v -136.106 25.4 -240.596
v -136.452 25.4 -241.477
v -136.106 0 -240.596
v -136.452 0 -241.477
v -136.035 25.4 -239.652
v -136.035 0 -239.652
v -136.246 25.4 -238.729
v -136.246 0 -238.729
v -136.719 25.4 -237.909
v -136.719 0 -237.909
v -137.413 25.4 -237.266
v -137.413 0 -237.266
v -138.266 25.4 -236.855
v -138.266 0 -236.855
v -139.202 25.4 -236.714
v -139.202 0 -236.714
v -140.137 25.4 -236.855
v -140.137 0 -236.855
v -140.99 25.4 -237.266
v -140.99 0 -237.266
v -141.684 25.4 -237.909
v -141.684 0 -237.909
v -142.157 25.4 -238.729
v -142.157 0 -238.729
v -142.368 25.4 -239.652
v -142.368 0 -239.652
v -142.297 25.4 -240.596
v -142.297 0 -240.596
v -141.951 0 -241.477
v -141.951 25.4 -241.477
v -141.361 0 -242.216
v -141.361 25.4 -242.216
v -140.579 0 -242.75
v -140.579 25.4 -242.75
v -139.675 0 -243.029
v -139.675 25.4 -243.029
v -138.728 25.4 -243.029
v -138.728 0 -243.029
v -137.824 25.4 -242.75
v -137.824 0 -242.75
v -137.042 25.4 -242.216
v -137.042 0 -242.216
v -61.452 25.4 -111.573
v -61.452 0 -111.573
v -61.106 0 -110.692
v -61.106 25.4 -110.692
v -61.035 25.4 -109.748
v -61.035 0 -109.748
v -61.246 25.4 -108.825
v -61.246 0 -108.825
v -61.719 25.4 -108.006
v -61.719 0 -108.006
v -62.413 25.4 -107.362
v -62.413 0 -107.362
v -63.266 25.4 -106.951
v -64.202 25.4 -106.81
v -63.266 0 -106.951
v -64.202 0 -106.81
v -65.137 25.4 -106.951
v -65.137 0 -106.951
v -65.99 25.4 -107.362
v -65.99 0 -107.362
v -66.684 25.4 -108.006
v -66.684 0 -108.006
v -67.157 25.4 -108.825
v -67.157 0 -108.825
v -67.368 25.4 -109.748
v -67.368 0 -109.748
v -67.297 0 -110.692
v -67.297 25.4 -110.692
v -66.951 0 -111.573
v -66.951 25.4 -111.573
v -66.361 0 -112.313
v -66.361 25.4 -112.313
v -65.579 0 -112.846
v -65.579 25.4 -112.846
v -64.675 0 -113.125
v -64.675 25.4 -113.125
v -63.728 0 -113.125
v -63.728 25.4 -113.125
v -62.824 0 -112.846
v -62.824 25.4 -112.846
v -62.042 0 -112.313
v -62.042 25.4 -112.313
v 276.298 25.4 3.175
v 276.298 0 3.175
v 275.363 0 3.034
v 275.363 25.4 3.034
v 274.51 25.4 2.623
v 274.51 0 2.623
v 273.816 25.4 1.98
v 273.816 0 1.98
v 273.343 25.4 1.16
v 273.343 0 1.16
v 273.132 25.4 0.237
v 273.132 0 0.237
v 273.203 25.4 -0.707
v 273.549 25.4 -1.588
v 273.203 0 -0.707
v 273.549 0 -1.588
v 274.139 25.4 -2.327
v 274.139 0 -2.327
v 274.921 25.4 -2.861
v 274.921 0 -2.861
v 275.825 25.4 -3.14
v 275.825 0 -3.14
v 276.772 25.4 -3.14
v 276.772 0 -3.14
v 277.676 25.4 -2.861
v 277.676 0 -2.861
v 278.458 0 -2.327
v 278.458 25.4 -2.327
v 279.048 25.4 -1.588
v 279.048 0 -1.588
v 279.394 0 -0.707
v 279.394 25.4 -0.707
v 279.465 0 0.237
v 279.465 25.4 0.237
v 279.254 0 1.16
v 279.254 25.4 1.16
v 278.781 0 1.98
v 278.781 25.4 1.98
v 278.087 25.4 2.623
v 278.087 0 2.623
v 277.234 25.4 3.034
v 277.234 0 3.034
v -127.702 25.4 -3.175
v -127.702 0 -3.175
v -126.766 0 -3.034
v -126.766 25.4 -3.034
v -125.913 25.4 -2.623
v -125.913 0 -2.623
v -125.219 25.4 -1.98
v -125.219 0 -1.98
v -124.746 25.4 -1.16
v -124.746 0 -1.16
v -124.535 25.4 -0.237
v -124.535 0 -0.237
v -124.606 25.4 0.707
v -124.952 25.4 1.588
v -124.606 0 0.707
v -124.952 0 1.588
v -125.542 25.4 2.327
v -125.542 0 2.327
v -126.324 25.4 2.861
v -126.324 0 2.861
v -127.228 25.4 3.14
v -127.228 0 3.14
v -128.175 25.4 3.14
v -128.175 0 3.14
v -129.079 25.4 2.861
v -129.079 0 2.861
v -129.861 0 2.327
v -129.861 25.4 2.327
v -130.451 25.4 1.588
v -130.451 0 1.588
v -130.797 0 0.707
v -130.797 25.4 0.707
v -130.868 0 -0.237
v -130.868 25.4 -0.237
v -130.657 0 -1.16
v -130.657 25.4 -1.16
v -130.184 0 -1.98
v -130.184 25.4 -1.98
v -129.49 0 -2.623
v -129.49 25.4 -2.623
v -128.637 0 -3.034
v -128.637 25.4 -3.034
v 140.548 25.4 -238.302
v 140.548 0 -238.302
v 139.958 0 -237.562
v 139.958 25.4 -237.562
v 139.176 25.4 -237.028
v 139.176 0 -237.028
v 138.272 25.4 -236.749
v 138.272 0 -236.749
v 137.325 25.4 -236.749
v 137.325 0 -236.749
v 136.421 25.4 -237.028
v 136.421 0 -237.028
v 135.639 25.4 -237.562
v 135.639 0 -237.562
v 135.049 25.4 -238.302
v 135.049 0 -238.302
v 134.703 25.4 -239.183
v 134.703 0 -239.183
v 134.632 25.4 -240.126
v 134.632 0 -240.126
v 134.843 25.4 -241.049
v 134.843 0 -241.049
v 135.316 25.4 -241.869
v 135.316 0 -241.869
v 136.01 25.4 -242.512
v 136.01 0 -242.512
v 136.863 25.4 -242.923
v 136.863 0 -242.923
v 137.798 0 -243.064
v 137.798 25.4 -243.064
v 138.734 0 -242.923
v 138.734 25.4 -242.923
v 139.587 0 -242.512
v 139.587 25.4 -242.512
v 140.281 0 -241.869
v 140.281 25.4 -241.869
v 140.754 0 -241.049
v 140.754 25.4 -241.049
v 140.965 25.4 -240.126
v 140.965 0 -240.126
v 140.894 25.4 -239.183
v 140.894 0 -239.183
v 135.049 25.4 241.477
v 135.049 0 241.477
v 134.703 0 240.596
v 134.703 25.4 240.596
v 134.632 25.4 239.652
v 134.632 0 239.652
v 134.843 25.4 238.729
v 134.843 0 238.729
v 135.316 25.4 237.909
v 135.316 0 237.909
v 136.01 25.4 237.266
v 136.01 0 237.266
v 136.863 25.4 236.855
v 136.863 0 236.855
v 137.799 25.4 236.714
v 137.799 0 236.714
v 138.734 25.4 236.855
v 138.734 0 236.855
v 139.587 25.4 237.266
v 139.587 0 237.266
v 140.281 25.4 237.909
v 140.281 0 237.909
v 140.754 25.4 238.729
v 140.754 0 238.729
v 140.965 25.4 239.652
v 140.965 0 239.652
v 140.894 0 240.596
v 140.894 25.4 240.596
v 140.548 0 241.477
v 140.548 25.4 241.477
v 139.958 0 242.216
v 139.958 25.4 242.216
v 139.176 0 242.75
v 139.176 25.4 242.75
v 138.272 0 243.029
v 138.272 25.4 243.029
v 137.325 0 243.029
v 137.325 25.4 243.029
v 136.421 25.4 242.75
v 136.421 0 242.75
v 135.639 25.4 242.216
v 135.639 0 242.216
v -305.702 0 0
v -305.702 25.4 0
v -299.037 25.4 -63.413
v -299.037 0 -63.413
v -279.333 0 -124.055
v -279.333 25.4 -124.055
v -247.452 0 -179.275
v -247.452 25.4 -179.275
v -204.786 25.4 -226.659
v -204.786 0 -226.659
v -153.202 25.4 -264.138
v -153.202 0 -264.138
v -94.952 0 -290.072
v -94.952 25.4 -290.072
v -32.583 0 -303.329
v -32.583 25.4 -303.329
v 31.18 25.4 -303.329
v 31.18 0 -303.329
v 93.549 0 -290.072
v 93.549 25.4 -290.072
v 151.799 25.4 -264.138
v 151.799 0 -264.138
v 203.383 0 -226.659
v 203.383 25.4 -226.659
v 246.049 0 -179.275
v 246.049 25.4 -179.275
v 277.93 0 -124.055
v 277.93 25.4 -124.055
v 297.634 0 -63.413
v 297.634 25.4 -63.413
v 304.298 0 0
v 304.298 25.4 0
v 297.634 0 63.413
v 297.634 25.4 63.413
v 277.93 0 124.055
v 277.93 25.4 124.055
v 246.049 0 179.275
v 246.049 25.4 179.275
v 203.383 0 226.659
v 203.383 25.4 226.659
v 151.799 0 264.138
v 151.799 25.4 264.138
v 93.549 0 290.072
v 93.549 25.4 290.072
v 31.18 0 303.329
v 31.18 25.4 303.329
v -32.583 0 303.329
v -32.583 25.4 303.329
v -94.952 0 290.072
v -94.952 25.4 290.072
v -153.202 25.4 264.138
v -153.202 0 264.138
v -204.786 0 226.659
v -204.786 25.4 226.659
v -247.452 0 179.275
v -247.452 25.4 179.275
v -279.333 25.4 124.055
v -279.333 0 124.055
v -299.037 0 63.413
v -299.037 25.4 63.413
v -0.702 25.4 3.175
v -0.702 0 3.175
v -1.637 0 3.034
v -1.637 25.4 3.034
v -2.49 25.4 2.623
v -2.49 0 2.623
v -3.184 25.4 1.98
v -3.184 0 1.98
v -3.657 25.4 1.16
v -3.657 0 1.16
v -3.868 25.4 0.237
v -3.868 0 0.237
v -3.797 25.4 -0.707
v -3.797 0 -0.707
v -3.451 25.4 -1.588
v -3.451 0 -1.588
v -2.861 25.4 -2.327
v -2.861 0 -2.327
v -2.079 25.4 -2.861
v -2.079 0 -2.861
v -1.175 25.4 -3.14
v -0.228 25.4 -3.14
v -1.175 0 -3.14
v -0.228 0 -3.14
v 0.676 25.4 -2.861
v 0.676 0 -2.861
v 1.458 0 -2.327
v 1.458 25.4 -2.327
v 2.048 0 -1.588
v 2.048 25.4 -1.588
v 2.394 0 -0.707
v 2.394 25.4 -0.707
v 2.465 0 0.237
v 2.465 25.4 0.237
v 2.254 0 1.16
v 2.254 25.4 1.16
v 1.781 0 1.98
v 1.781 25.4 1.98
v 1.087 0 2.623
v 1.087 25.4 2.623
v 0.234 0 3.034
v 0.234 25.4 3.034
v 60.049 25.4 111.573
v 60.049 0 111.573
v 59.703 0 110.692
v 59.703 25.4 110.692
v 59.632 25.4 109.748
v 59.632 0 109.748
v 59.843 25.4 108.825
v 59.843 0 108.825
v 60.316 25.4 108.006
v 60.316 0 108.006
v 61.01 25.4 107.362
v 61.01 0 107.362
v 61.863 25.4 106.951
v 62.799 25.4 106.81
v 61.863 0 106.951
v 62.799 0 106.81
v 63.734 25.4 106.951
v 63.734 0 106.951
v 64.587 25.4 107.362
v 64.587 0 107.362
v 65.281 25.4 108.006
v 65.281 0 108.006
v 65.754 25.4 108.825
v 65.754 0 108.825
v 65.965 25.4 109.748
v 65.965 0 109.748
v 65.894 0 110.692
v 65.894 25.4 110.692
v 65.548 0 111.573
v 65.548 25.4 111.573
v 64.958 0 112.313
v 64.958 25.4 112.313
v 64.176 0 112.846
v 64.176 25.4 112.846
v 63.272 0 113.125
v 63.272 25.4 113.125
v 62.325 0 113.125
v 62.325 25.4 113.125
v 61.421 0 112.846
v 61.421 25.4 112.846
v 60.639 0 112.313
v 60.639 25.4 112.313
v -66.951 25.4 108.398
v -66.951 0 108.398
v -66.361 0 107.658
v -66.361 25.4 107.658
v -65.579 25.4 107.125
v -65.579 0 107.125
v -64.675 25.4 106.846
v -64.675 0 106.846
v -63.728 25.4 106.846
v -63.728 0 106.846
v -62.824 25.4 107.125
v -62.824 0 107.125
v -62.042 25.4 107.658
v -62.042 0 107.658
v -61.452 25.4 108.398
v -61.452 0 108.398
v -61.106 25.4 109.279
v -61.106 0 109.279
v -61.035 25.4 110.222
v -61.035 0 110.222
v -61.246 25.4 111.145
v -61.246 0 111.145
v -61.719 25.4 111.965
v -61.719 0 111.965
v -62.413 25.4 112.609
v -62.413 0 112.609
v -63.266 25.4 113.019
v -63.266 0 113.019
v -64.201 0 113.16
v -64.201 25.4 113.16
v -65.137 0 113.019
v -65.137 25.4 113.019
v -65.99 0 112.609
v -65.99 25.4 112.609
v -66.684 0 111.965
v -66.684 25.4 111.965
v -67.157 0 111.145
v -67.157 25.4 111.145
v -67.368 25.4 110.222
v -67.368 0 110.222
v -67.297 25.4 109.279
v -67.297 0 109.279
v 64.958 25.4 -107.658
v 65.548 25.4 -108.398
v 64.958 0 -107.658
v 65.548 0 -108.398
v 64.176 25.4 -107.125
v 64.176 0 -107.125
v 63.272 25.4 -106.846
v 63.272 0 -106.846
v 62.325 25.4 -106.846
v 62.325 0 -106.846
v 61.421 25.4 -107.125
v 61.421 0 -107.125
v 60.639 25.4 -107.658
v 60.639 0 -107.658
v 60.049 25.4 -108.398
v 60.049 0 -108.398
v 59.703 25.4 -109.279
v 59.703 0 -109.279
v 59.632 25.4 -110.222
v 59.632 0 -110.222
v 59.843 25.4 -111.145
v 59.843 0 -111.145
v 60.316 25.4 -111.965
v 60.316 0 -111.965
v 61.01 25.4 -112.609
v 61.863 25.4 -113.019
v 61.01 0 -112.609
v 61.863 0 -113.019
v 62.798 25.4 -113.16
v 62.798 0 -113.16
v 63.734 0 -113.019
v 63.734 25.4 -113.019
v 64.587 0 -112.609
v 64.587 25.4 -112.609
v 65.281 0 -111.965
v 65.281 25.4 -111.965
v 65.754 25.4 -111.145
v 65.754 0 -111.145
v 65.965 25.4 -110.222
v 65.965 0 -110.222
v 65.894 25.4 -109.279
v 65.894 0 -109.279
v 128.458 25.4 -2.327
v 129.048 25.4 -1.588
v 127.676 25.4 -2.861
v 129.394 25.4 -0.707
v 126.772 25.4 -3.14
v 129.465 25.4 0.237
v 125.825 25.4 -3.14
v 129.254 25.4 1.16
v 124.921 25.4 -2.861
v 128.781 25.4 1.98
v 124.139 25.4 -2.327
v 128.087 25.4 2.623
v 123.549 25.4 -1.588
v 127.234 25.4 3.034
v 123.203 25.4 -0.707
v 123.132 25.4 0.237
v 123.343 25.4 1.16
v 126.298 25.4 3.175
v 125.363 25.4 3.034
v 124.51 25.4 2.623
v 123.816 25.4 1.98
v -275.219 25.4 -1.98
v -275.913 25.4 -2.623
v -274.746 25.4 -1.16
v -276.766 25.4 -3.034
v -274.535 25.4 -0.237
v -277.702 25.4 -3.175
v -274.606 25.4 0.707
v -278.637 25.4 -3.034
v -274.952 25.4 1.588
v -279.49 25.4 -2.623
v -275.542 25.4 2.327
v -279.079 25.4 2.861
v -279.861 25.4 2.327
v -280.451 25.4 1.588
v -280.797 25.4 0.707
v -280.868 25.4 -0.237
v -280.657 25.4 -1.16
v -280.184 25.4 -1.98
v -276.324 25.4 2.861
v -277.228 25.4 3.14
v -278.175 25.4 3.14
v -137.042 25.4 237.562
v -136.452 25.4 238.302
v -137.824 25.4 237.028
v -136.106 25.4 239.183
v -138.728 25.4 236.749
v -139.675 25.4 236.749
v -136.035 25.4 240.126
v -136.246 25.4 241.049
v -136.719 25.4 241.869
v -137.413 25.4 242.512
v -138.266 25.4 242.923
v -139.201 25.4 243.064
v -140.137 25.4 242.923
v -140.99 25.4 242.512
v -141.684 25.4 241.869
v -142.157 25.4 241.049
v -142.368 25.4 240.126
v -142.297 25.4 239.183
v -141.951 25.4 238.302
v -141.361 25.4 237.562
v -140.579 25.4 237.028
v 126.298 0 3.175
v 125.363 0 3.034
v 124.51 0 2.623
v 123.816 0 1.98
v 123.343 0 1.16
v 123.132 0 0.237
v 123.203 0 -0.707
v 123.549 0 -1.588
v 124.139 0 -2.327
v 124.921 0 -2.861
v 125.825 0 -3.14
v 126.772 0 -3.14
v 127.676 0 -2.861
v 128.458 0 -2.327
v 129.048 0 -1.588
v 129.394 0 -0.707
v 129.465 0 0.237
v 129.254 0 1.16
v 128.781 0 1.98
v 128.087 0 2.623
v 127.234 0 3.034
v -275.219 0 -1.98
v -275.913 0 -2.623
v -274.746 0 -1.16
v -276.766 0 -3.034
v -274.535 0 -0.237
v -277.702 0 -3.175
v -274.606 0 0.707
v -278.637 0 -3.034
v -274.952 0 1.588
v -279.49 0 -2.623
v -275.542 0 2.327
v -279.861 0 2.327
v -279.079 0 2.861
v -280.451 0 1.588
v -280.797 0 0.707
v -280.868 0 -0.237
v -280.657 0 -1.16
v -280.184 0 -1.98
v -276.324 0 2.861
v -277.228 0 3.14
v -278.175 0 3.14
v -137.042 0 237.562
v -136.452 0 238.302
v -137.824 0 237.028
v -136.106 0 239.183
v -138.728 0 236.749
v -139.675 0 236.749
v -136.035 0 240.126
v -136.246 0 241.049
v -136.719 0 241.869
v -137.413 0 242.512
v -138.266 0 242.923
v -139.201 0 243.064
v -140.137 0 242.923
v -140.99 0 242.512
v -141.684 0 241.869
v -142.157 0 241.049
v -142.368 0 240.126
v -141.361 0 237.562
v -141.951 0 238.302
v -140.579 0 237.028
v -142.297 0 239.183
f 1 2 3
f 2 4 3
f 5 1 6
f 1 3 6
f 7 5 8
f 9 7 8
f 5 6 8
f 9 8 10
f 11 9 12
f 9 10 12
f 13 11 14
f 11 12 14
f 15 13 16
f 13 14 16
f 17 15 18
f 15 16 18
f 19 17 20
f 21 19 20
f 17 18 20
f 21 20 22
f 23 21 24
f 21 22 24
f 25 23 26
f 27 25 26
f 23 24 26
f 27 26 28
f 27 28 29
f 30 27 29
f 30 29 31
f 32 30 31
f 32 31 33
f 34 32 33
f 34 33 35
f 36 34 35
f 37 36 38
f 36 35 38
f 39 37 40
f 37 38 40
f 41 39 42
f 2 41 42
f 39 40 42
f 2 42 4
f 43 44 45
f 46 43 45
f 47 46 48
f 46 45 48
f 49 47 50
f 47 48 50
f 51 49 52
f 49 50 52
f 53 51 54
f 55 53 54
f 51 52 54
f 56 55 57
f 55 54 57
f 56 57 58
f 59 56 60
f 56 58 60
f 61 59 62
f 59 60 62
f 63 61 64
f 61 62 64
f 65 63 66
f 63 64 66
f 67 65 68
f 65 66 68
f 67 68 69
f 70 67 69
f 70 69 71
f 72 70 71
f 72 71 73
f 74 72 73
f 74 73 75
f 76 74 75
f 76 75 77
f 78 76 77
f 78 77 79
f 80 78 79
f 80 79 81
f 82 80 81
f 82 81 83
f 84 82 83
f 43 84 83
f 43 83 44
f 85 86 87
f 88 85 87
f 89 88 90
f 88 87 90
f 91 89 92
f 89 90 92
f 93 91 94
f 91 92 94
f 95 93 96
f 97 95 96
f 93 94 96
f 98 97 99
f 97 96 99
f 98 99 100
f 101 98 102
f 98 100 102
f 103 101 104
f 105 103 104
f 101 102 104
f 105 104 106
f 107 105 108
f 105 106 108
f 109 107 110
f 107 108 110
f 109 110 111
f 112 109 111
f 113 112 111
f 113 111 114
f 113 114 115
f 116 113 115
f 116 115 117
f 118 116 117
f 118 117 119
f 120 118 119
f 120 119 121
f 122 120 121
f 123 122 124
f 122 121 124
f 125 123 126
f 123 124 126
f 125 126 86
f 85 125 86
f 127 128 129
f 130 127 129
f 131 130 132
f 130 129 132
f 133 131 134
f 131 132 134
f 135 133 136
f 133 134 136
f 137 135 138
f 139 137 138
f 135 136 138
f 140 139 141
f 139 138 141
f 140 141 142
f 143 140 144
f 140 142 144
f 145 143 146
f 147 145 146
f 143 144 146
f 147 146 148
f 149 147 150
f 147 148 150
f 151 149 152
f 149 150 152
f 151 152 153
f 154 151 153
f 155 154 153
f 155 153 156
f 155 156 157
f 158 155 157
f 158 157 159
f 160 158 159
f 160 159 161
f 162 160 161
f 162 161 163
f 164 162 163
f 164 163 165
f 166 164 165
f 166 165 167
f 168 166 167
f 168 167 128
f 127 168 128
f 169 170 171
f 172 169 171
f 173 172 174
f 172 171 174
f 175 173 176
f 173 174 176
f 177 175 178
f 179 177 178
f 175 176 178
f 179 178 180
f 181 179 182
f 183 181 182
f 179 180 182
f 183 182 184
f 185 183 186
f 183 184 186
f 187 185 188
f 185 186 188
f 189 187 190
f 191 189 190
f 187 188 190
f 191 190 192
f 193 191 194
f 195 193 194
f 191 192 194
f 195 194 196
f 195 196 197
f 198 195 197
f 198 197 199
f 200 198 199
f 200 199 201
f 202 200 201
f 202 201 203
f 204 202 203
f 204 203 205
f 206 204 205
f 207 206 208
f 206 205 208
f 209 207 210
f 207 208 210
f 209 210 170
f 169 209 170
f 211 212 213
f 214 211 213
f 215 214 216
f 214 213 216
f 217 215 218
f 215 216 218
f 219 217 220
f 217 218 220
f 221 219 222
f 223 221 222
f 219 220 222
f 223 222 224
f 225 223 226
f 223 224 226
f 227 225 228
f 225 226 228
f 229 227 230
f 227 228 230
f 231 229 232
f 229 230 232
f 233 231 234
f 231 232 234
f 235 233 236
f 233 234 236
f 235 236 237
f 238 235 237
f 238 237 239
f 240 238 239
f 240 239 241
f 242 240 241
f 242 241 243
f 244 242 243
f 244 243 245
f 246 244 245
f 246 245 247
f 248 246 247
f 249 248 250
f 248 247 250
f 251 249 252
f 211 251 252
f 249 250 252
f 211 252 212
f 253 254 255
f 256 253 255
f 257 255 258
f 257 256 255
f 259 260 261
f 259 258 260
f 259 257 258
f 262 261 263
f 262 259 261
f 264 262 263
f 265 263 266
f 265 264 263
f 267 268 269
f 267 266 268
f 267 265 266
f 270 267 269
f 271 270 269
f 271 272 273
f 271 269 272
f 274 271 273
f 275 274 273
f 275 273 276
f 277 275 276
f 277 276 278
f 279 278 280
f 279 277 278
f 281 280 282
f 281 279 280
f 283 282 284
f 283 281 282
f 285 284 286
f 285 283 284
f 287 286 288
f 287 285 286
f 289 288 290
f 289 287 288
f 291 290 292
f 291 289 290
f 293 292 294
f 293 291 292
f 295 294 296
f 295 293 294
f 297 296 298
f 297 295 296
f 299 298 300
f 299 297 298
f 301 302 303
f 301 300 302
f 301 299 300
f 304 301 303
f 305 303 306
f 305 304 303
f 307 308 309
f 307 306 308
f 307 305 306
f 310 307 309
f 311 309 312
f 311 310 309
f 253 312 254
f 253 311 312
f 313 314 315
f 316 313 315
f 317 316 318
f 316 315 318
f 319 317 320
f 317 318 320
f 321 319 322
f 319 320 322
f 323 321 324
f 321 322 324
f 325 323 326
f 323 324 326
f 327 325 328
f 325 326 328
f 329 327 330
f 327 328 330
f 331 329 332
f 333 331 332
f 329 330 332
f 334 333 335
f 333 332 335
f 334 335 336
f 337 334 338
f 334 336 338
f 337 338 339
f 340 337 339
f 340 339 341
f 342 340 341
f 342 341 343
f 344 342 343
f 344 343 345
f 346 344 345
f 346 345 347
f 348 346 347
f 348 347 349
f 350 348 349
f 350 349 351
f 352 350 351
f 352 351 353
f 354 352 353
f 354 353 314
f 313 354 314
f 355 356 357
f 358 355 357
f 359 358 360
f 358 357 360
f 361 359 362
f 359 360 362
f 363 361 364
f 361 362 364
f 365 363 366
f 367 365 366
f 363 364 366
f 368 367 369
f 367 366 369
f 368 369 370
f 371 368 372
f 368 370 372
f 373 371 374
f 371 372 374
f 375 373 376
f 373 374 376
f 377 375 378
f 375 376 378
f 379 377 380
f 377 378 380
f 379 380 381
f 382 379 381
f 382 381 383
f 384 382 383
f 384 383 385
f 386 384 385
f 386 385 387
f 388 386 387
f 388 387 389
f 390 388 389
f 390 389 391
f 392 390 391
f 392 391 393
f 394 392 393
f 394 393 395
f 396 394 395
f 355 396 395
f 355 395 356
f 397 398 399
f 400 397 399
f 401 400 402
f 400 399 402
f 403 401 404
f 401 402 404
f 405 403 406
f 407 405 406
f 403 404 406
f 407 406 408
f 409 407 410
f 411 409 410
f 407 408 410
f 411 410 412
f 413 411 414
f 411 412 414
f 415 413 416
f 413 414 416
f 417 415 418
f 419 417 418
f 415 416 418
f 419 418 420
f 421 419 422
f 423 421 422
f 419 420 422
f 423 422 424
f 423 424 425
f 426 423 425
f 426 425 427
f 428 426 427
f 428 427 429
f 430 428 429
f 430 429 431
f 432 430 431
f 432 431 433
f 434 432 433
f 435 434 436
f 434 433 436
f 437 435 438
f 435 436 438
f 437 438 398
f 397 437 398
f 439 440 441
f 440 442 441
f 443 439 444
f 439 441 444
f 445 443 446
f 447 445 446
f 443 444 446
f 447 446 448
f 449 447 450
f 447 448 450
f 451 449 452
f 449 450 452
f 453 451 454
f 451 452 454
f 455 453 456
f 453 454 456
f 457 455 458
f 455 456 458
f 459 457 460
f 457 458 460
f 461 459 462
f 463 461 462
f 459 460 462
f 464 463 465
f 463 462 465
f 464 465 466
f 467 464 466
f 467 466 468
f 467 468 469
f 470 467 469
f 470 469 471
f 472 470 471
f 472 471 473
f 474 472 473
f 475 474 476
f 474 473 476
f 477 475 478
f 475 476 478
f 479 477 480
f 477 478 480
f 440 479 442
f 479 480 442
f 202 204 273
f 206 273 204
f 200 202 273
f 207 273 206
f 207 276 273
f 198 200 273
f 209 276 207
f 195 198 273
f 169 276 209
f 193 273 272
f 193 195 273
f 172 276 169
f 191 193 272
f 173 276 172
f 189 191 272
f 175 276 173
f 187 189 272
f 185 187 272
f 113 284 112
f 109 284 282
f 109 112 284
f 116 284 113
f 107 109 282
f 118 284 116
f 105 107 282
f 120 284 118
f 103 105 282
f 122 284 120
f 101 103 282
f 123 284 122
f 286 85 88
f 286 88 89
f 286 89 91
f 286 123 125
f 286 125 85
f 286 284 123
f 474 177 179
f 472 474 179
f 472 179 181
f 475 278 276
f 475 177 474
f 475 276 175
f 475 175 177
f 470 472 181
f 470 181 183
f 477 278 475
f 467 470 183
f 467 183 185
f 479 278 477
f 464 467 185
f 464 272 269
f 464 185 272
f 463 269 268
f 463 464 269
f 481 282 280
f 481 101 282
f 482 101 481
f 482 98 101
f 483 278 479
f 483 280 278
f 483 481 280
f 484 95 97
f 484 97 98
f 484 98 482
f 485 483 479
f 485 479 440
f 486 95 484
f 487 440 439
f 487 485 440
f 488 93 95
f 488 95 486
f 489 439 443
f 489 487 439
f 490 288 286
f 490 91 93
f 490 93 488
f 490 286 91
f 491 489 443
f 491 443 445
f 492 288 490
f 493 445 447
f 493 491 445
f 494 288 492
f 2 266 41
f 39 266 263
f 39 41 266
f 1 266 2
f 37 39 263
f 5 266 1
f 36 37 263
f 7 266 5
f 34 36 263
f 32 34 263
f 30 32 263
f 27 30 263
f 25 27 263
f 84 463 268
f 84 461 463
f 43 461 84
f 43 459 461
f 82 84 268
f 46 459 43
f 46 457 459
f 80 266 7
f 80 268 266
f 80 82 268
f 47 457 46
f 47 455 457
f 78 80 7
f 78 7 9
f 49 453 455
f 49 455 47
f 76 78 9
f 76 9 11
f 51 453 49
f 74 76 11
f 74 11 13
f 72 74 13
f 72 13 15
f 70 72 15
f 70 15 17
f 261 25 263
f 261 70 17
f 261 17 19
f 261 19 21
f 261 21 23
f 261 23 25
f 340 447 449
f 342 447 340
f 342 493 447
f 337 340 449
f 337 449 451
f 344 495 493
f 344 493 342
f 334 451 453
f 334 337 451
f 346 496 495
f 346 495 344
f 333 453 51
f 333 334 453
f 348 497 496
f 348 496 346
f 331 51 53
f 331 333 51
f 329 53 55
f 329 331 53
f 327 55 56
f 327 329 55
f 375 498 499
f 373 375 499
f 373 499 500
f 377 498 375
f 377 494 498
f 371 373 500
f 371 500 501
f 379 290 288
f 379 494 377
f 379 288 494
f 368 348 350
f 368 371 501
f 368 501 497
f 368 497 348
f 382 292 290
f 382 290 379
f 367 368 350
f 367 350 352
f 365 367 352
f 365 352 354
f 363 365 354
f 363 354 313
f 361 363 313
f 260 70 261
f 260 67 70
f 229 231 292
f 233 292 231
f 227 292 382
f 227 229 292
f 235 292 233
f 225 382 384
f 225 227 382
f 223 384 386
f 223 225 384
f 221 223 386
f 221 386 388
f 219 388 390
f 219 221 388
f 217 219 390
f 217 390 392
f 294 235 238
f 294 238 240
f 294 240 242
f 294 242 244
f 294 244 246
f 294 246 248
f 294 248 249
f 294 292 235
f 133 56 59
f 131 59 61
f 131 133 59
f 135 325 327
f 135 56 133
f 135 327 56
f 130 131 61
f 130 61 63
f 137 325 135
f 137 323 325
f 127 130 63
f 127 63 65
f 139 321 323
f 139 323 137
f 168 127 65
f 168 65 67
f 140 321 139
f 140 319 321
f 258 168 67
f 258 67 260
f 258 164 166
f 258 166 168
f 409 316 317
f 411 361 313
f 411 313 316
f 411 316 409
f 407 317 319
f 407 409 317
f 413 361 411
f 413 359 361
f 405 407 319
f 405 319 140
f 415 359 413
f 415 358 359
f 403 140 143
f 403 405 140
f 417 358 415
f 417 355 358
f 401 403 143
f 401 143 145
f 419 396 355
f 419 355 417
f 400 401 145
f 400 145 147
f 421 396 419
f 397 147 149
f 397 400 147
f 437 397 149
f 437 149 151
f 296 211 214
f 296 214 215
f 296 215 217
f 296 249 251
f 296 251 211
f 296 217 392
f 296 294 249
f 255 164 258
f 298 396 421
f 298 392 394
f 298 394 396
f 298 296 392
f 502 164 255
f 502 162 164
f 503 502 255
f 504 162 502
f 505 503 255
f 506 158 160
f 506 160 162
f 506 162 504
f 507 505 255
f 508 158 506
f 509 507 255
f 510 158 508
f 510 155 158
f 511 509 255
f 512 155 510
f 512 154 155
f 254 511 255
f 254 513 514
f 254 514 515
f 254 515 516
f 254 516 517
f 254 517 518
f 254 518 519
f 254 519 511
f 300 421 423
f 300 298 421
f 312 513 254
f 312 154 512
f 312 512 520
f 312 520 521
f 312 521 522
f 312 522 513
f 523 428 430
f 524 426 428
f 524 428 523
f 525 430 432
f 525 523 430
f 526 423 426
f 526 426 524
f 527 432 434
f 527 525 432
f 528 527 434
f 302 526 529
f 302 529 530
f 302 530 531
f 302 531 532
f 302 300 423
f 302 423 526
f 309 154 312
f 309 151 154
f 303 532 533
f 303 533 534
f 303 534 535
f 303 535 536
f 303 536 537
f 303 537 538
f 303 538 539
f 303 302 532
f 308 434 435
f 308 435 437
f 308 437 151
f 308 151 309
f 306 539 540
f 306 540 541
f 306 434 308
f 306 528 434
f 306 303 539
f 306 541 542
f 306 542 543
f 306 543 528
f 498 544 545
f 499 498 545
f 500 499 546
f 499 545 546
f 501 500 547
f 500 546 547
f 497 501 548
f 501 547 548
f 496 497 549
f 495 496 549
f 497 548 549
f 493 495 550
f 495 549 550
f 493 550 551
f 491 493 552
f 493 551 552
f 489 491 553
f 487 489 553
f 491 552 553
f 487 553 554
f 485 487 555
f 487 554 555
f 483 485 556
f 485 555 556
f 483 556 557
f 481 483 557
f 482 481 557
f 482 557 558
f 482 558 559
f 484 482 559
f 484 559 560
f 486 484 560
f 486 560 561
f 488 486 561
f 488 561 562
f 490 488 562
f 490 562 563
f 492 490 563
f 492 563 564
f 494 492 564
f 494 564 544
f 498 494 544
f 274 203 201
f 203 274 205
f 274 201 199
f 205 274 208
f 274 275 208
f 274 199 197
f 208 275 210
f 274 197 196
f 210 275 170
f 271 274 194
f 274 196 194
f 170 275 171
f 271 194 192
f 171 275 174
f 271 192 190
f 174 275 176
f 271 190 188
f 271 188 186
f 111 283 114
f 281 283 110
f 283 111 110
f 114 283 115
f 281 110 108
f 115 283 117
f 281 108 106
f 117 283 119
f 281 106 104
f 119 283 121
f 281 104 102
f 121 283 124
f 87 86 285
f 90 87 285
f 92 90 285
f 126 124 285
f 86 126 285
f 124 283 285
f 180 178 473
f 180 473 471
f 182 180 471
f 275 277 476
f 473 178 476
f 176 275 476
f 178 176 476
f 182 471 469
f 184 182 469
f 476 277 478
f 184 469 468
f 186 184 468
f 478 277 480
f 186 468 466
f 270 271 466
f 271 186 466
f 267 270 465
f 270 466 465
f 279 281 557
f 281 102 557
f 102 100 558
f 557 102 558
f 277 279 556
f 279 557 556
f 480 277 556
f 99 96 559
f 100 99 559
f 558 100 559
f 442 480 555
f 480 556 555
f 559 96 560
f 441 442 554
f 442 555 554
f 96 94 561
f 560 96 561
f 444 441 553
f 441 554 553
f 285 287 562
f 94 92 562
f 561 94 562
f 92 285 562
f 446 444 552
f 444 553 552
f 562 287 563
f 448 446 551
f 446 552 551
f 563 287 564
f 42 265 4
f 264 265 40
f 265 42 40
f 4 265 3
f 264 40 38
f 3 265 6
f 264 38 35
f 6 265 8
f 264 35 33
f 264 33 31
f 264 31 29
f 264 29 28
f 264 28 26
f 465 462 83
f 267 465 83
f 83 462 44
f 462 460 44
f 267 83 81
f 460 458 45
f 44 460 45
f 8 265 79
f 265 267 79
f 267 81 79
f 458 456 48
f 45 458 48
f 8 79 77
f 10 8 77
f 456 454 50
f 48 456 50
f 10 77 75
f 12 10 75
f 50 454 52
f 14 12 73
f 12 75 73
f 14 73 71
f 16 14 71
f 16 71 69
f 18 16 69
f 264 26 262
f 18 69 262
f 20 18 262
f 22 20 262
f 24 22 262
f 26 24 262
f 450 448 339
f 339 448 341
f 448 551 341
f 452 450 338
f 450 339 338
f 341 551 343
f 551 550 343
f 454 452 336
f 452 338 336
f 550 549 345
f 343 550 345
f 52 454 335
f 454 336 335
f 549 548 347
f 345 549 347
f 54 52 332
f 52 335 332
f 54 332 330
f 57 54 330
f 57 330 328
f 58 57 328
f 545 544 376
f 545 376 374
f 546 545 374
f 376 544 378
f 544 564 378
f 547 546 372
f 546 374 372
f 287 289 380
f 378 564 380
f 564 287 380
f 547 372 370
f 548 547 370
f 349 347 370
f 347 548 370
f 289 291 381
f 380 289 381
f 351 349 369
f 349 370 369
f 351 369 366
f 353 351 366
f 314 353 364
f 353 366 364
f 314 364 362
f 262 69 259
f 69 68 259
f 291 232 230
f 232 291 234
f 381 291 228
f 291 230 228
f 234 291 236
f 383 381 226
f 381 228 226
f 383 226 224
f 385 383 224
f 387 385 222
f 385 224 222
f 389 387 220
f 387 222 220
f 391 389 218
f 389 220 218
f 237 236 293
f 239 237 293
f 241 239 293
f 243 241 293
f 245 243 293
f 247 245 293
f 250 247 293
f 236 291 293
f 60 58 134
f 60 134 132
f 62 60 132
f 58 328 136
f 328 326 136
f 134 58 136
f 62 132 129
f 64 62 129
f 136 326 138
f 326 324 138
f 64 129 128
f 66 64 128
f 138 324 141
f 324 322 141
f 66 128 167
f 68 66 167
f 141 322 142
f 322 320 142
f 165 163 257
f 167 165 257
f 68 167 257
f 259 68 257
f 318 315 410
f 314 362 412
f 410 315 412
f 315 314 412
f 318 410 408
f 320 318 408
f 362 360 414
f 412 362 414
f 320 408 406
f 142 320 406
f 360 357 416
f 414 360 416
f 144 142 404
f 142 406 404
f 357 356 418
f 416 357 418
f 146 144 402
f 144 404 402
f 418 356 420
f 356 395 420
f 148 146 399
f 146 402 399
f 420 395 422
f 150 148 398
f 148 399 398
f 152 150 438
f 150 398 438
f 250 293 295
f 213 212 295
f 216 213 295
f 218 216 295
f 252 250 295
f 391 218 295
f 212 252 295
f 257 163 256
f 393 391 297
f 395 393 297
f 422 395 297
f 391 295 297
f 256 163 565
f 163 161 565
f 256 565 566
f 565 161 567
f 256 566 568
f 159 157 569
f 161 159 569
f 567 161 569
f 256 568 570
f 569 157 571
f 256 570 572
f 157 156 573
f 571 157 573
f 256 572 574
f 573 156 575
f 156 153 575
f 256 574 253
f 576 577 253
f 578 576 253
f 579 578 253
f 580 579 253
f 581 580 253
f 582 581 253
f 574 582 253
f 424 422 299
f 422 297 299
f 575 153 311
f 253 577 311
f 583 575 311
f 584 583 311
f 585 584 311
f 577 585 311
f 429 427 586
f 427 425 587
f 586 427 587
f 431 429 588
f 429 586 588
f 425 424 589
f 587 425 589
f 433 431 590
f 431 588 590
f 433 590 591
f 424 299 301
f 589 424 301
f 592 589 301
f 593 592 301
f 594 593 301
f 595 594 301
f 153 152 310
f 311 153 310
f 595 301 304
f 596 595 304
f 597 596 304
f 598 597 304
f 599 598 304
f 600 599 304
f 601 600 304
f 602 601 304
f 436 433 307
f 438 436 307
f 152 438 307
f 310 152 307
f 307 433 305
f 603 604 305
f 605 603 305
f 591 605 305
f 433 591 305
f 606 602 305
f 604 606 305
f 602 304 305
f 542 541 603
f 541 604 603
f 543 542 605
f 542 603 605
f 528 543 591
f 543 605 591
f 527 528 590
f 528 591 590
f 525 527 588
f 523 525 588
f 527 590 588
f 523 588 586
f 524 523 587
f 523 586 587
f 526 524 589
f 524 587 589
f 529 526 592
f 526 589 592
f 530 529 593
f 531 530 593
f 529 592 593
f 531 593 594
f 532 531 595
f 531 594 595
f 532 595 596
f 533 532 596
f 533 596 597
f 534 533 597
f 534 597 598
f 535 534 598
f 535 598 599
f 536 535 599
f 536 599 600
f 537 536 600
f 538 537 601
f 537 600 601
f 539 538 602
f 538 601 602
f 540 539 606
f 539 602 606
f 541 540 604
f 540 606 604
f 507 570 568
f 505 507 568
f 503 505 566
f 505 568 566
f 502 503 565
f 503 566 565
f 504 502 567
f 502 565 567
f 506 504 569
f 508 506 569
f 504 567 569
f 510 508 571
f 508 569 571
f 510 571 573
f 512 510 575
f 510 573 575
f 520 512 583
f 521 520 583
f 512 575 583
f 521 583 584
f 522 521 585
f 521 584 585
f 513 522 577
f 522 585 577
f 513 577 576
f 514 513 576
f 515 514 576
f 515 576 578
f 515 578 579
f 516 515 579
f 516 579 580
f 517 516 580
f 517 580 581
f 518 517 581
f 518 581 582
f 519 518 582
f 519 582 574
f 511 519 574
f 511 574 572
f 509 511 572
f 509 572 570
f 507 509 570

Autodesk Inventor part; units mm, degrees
ref_plane "YZ Plane" through (0, 0, 0) normal (1, 0, 0) x (0, 1, 0)
ref_plane "XZ Plane" through (0, 0, 0) normal (0, 1, 0) x (-1, 0, 0)
ref_plane "XY Plane" through (0, 0, 0) normal (0, 0, 1) x (1, 0, 0)
sketch "Sketch1" plane through (0, 0, 0) normal (0, 1, 0) x (-1, 0, 0)
  circle A0 centre (0.7015, 0) radius 305
  point P0 (0, 0)
  dimension "d0" = 610
extrude "Extrusion1" add sketch "Sketch1" along normal blind 25.4
sketch "Sketch2" plane through (-0.7015, 25.4, 0) normal (0, 1, 0) x (1, 0, 0)
  circle A0 centre (0, 0) radius 305 projected
  circle A1 centre (0, 0) radius 4.5
  circle A2 centre (127, 0) radius 4.5
  circle A3 centre (277, 0) radius 4.5
  dimension "d3" = 127
  dimension "d4" = 150
  dimension "d15" = 9
  dimension "d16" = 9
  dimension "d17" = 9
hole "Hole1" at (-0.7015, 25.4, 0) at (126.2985, 25.4, 0) at (276.2985, 25.4, 0) direction (0, -1, 0) diameter 6.35 end through all
pattern_circular "Circular Pattern1" count 6 over 360 about axis through (-0.7015, -837.6441, 0) along (0, 1, 0) of "Hole1"
properties part number "bpSparJig" material "Wood (Cherry)"
